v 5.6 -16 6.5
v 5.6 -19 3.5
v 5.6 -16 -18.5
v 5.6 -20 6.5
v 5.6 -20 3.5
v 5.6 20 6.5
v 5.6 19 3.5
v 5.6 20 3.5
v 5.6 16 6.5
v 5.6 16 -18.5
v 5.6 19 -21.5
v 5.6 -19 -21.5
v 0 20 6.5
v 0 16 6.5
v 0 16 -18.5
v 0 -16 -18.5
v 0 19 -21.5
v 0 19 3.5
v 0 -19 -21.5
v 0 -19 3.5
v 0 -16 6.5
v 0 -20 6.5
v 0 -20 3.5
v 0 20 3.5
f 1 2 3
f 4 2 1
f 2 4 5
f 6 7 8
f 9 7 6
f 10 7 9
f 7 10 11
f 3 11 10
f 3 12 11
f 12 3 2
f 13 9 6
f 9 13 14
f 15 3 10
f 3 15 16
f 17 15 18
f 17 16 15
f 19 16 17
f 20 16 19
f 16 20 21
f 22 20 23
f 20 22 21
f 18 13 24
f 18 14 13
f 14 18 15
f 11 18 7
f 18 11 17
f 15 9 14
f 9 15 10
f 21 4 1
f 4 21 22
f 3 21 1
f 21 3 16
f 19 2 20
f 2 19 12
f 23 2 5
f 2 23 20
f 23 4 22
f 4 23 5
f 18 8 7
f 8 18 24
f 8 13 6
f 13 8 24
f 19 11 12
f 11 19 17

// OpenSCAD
// battery holder for robot

// 
//    |- 24.5 -|
//       ----       -
//     /      \     |
//    |        |    |
//    |        |   46
//    |        |    |
//     \      /     |
//       ----       -
$fn = 200;
height=8;

module holder(){
    difference(){
        union(){
            // top with screwholes
            translate([-14.3,0,height/2])
            cube([5, 43, height], center=true);
            // holder - outline
            translate([-(29-25.5)/2,0,0])
            hull(){
                cylinder(r=30/2, h=height);
                translate([24.5,0,0])
                cylinder(r=30/2, h=height);
            }
            
            translate([-2,-21,0])
            difference(){
                cube([10,6,3]);
                translate([2,2,-0.5])
                cube([6,4,height+1]);
            }
            
            translate([-2,15,0])
            difference(){
                cube([10,6,3]);
                translate([2,0,-0.5])
                cube([6,4,height+1]);
            }
        }
        
        // that is the cutout for the battery
        translate([0,0,-1])
        hull(){
            cylinder(r=24.5/2, h=height+2);
            translate([22.5,0,0])
            cylinder(r=24.5/2, h=height+2);
        }
        
        // cutout for screws
        translate([-20,16+1.5,height/2])
        rotate([0,90,0])
        cylinder(r=1.6, h=10, $fn=200);
        
        translate([-14.5,16+1.5,height/2])
        rotate([0,90,0])
        cylinder(r=3.2, h=3, $fn=6);     
        
        translate([-20,-16-1.5,height/2])
        rotate([0,90,0])
        cylinder(r=1.6, h=10, $fn=200);    

        translate([-14.5,-16-1.5,height/2])
        rotate([0,90,0])
        cylinder(r=3.2, h=3, $fn=6); 
        
        // simulate screw head
        /*
        translate([-15,-17,4])
        rotate([0,90,0])
        #cylinder(r=5.5/2, h=10, $fn=200);        
        */
    }
}

module bugel(){
    /*
    translate([0,16,-18.5])
    %cube([10,10,18.5]);
    */
    
    translate([0,16,-18.5])
    cube([5.6, 3,25]);
    
    
    translate([0,-16-3,-18.5])
    cube([5.6, 3,25]);
    
    translate([0,-16-4,3.5])
    cube([5.6,4,3]);
    
    translate([0,16,3.5])
    cube([5.6,4,3]);
    
    myheight=3;
    translate([0,-19,-18.5-myheight])
    cube([5.6,38,myheight]);
}

//holder();
bugel();
